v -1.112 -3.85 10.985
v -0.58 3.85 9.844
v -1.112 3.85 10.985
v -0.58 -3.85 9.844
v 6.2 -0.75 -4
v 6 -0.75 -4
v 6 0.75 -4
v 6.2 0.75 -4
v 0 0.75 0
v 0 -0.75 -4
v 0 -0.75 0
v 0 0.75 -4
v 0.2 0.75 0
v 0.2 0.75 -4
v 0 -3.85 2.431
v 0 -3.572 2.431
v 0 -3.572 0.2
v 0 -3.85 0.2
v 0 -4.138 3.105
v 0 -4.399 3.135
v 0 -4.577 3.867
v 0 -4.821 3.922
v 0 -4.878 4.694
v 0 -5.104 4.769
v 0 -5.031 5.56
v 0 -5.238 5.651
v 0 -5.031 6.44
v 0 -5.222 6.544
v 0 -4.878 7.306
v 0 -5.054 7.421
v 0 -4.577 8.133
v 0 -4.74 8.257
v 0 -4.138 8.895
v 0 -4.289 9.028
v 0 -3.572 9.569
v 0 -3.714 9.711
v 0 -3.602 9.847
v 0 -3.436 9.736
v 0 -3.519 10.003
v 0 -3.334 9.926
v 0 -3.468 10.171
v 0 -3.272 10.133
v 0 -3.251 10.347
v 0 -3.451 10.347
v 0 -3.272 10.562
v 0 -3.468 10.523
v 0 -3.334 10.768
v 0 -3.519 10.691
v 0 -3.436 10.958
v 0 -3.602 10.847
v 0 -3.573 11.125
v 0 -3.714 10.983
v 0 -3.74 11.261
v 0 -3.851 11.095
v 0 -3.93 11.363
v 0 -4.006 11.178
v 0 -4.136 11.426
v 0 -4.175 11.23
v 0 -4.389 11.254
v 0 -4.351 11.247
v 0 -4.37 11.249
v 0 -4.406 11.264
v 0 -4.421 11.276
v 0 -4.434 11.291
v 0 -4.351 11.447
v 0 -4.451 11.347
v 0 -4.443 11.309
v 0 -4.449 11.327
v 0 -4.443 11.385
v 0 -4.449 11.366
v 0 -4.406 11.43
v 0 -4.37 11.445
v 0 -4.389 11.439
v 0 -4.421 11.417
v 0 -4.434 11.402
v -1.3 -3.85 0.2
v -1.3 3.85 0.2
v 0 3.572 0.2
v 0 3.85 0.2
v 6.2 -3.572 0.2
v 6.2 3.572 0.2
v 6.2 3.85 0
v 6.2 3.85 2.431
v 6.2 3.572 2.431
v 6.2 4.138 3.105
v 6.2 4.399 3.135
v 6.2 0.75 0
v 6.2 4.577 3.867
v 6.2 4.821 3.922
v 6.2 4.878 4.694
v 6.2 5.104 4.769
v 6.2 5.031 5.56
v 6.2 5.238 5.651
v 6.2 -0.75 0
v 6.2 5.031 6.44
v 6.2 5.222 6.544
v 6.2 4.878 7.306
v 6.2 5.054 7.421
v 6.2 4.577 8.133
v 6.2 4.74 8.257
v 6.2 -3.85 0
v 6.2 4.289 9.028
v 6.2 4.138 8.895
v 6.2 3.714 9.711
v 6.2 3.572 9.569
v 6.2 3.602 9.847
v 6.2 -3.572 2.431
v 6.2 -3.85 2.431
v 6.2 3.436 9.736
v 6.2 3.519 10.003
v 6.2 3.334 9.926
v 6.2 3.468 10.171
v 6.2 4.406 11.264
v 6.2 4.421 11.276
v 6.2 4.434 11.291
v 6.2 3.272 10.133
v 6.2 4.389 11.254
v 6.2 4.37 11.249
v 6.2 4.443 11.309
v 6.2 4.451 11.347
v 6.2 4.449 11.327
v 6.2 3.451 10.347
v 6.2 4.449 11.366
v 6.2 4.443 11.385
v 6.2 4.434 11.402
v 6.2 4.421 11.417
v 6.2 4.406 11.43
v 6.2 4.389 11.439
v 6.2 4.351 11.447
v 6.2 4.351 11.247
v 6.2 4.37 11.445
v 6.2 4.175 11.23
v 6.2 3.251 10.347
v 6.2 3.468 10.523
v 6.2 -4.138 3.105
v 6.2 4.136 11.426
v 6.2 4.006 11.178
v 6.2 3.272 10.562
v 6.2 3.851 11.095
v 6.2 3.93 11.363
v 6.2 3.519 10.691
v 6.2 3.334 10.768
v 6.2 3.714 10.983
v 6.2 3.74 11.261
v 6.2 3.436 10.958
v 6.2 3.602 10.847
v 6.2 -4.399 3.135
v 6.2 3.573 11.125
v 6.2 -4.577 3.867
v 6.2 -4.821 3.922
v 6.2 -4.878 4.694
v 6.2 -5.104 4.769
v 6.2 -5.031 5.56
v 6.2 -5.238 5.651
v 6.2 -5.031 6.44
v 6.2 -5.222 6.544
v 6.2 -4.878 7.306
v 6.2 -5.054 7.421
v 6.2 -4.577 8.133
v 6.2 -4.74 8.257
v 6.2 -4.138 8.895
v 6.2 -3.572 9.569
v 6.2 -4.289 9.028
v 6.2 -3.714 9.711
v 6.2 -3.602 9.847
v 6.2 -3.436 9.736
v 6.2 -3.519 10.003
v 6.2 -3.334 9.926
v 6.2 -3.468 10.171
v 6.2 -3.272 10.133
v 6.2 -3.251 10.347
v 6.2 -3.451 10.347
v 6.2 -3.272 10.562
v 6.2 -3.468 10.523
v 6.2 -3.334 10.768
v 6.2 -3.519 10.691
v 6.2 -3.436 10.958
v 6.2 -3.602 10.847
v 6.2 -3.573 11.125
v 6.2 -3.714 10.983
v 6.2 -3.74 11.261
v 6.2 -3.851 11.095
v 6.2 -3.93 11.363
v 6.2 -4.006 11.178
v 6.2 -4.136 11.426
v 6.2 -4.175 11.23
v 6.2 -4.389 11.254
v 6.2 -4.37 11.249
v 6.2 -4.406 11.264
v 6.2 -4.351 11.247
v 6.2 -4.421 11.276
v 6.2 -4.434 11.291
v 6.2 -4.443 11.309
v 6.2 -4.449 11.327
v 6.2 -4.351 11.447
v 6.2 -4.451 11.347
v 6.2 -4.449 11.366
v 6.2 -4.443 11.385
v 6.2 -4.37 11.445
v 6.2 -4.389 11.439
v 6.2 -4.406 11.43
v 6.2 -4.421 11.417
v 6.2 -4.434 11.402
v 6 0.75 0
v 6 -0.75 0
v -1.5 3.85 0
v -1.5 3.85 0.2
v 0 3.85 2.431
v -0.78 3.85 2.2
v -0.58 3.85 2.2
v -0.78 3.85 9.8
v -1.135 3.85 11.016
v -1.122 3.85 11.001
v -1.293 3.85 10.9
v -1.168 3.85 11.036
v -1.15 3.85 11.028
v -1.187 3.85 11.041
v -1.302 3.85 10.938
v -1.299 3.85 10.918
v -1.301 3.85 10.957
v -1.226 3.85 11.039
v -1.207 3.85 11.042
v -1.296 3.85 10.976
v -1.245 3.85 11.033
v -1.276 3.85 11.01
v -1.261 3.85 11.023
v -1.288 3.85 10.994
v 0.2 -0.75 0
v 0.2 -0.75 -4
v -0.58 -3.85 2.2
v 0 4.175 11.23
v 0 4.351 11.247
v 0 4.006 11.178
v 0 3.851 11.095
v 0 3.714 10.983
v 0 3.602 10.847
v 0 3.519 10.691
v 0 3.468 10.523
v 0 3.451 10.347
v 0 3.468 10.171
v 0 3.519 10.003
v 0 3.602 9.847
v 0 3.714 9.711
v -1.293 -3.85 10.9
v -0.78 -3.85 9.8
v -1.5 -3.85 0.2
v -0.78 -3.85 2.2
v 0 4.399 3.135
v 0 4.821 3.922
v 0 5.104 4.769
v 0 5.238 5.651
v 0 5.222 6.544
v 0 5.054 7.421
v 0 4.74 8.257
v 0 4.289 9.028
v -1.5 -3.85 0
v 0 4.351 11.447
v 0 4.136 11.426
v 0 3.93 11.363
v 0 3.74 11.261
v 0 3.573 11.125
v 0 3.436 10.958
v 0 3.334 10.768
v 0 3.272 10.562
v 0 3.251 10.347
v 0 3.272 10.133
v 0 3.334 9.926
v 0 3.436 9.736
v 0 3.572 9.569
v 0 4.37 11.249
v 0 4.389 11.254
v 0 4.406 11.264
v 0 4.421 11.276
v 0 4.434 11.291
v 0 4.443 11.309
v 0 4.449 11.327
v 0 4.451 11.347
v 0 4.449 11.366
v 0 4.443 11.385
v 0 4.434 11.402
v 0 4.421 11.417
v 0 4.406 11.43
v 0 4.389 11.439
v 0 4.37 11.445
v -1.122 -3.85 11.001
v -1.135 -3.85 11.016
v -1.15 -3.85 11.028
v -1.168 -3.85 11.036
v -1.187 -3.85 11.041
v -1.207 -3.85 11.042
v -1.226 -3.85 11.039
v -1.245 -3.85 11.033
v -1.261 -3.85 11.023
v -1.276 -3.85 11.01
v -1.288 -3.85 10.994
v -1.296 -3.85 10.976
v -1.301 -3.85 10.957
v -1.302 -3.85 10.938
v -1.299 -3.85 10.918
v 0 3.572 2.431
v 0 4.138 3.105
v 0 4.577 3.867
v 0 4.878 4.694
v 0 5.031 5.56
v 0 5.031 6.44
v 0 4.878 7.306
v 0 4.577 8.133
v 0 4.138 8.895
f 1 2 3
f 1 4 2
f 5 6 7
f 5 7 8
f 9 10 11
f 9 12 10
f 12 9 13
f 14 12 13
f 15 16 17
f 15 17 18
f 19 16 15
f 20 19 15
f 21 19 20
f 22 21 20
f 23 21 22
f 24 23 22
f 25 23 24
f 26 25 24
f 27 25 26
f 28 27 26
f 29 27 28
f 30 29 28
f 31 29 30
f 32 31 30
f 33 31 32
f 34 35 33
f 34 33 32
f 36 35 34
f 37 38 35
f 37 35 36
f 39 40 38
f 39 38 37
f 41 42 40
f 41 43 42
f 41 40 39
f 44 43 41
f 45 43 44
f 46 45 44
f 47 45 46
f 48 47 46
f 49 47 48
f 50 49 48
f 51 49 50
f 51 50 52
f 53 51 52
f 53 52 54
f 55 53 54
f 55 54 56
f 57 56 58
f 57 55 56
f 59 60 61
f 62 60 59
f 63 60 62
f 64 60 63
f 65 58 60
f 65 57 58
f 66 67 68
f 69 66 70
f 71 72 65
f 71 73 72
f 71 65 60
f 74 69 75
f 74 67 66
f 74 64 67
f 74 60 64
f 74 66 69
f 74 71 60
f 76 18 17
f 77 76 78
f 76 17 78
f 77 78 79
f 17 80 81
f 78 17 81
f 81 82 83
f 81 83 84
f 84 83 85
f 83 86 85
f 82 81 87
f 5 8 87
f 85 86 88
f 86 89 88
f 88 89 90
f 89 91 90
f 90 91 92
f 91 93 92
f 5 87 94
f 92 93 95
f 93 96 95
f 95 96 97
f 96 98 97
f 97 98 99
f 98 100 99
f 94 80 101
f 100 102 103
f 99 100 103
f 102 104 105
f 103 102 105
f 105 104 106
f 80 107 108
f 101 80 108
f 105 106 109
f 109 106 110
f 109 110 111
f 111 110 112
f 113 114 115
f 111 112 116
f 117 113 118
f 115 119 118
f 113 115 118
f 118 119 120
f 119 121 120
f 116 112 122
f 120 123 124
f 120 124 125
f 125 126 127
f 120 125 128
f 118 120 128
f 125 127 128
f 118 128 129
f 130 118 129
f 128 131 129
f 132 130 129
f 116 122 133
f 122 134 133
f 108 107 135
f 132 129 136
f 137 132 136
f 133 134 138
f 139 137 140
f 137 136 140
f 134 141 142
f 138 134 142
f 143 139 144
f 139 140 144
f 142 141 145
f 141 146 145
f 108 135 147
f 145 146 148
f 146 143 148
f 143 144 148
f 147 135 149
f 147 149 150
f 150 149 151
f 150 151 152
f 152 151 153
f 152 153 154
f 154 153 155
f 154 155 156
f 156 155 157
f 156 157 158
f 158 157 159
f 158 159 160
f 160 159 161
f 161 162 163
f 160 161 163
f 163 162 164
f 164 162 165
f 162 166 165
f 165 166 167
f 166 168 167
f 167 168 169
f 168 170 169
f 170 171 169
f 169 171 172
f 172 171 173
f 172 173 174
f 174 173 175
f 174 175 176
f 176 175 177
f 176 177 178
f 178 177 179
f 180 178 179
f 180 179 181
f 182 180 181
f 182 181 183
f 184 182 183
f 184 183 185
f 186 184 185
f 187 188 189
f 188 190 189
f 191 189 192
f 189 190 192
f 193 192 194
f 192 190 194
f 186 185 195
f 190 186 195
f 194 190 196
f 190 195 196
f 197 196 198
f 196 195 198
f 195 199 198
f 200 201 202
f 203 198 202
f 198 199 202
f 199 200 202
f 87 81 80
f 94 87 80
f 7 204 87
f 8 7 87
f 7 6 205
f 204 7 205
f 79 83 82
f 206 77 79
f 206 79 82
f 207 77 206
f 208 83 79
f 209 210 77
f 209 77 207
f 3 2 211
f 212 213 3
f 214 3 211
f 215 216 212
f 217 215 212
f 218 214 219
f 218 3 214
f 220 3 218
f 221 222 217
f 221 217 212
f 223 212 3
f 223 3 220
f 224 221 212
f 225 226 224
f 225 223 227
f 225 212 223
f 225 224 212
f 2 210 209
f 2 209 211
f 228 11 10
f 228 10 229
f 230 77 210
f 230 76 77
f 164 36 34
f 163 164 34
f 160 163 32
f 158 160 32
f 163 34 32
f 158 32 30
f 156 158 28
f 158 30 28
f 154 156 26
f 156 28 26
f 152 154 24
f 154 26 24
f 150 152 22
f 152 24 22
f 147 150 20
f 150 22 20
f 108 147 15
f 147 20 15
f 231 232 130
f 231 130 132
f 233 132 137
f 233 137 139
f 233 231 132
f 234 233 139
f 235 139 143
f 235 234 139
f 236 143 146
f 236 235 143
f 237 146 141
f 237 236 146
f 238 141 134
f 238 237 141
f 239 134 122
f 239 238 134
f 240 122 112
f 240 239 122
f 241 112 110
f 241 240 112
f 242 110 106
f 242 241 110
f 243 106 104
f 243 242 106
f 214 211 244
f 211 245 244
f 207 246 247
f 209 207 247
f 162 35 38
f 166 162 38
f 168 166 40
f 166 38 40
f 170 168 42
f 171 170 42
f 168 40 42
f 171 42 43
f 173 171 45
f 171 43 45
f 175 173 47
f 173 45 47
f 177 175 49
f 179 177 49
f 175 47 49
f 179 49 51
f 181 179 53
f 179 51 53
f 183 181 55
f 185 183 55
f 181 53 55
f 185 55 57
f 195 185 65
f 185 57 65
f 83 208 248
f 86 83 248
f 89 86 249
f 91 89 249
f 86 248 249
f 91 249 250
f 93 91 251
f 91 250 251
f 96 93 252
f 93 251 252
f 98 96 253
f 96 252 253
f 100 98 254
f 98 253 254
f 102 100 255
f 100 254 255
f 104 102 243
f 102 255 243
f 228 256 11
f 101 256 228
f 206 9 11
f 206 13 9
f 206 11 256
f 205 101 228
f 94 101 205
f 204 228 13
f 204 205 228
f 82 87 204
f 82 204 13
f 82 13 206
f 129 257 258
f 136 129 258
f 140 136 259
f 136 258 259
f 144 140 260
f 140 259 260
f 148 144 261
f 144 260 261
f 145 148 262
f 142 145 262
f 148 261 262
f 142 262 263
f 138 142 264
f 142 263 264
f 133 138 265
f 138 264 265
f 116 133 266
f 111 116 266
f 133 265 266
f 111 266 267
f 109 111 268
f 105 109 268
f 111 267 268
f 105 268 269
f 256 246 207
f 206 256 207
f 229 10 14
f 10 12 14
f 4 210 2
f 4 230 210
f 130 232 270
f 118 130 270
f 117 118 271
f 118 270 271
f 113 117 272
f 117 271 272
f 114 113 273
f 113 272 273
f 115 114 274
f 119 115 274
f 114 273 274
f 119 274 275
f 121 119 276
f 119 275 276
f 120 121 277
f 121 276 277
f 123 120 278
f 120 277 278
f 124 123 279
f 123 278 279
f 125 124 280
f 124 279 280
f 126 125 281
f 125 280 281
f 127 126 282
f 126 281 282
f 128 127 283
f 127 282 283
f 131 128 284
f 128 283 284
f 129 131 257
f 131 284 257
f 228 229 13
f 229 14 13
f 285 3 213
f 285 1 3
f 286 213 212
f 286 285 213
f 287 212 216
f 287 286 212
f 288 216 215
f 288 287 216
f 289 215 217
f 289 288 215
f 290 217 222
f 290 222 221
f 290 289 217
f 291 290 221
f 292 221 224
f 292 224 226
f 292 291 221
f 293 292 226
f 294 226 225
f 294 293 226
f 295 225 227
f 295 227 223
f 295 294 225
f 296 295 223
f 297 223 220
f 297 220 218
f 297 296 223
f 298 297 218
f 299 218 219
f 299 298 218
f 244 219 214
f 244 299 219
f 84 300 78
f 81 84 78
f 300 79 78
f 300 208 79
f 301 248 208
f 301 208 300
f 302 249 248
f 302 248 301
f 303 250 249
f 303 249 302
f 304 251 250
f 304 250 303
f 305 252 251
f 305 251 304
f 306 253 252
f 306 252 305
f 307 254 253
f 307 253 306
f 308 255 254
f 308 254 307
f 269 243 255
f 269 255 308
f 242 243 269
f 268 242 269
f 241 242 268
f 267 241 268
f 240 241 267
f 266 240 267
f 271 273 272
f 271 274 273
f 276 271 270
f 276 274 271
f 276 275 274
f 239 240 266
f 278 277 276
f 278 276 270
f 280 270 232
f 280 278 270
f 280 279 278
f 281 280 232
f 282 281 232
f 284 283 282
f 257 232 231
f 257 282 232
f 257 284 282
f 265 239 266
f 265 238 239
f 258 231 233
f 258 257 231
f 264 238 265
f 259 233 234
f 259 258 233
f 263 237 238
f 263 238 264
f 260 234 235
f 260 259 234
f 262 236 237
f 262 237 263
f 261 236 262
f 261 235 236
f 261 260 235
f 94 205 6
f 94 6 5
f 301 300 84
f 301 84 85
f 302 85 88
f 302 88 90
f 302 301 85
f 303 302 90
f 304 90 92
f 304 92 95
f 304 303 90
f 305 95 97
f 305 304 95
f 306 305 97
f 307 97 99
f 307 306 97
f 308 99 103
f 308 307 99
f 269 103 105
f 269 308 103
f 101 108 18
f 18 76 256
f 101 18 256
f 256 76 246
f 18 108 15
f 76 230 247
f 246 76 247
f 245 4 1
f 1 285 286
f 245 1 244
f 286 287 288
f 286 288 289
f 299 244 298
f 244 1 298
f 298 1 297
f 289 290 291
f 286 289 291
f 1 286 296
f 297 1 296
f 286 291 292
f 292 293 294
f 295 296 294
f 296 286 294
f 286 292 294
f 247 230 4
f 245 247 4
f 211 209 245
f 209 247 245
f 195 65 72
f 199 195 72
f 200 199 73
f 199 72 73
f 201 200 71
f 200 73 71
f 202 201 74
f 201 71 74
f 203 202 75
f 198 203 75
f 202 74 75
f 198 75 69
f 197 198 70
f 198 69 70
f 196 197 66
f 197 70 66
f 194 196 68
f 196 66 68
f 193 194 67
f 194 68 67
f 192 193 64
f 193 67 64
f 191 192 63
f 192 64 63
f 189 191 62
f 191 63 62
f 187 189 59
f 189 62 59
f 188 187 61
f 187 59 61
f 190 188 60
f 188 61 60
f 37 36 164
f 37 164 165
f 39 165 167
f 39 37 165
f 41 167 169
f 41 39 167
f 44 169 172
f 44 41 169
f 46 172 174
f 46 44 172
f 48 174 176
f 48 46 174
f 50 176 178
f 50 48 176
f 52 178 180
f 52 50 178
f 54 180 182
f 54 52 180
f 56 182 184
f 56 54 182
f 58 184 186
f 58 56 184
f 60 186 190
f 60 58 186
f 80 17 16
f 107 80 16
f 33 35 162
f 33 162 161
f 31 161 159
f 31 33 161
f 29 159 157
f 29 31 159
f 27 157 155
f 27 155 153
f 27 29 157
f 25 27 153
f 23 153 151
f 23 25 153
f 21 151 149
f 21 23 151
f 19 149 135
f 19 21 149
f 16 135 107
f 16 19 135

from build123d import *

# Parameters (mm, degrees)
PAD_DEPTH    = 6.2
SKETCH001_W  = 7.7
SKETCH001_H  = 0.2
PAD001_DEPTH = 1.5
PAD002_DEPTH = 3.85
SKETCH003_W  = 0.2
SKETCH003_H  = 4
PAD003_DEPTH = 0.75


with BuildPart() as part:
    # Sketch → Pad (new body)
    with BuildSketch(Plane.YZ):
        with BuildLine():
            ThreePointArc((-3.572464, 9.569314), (-5.05, 6), (-3.572464, 2.430686))
            Line((-3.572464, 0.2), (-3.572464, 2.430686))
            Line((3.572464, 0.2), (-3.572464, 0.2))
            Line((3.572464, 2.430686), (3.572464, 0.2))
            ThreePointArc((3.572464, 2.430686), (5.05, 6), (3.572464, 9.569314))
            ThreePointArc((4.350625, 11.446788), (3.33445, 10.767964), (3.572464, 9.569314))
            ThreePointArc((4.350625, 11.246788), (4.450625, 11.346788), (4.350625, 11.446788))
            ThreePointArc((4.350625, 11.246788), (3.519209, 10.691386), (3.713948, 9.710673))
            ThreePointArc((3.85, 2.430686), (5.249083, 6.098098), (3.713948, 9.710673))
            Line((3.85, 2.430686), (3.85, 0))
            Line((-3.85, 0), (3.85, 0))
            Line((-3.85, 2.430686), (-3.85, 0))
            ThreePointArc((-3.713948, 9.710673), (-5.249083, 6.098098), (-3.85, 2.430686))
            ThreePointArc((-3.713948, 9.710673), (-3.519209, 10.691387), (-4.350626, 11.246788))
            ThreePointArc((-4.350626, 11.446788), (-4.450626, 11.346788), (-4.350626, 11.246788))
            ThreePointArc((-3.572464, 9.569314), (-3.33445, 10.767964), (-4.350626, 11.446788))
        make_face()
    extrude(amount=PAD_DEPTH)

    # Sketch001 → Pad001 (join)
    with BuildSketch(Plane.YZ):
        with Locations((0, 0.1)):
            Rectangle(SKETCH001_W, SKETCH001_H)
    extrude(amount=-PAD001_DEPTH)

    # Sketch002 → Pad002 (join, symmetric)
    with BuildSketch(Plane.XZ):
        with BuildLine():
            Line((-1.5, 0.2), (-0.78, 2.2))
            Line((-0.78, 2.2), (-0.78, 9.8))
            Line((-0.78, 9.8), (-1.292938, 10.9))
            ThreePointArc((-1.111677, 10.984524), (-1.244569, 11.032893), (-1.292938, 10.9))
            Line((-0.58, 9.844339), (-1.111677, 10.984524))
            Line((-0.58, 2.2), (-0.58, 9.844339))
            Line((-1.3, 0.2), (-0.58, 2.2))
            Line((-1.3, 0), (-1.3, 0.2))
            Line((-1.5, 0), (-1.3, 0))
            Line((-1.5, 0.2), (-1.5, 0))
        make_face()
    extrude(amount=PAD002_DEPTH, both=True)

    # Sketch003 → Pad003 (join, symmetric)
    with BuildSketch(Plane.XZ):
        with Locations((0.1, -2)):
            Rectangle(SKETCH003_W, SKETCH003_H)
        with Locations((6.1, -2)):
            Rectangle(SKETCH003_W, SKETCH003_H)
    extrude(amount=PAD003_DEPTH, both=True)


solid = part.part
